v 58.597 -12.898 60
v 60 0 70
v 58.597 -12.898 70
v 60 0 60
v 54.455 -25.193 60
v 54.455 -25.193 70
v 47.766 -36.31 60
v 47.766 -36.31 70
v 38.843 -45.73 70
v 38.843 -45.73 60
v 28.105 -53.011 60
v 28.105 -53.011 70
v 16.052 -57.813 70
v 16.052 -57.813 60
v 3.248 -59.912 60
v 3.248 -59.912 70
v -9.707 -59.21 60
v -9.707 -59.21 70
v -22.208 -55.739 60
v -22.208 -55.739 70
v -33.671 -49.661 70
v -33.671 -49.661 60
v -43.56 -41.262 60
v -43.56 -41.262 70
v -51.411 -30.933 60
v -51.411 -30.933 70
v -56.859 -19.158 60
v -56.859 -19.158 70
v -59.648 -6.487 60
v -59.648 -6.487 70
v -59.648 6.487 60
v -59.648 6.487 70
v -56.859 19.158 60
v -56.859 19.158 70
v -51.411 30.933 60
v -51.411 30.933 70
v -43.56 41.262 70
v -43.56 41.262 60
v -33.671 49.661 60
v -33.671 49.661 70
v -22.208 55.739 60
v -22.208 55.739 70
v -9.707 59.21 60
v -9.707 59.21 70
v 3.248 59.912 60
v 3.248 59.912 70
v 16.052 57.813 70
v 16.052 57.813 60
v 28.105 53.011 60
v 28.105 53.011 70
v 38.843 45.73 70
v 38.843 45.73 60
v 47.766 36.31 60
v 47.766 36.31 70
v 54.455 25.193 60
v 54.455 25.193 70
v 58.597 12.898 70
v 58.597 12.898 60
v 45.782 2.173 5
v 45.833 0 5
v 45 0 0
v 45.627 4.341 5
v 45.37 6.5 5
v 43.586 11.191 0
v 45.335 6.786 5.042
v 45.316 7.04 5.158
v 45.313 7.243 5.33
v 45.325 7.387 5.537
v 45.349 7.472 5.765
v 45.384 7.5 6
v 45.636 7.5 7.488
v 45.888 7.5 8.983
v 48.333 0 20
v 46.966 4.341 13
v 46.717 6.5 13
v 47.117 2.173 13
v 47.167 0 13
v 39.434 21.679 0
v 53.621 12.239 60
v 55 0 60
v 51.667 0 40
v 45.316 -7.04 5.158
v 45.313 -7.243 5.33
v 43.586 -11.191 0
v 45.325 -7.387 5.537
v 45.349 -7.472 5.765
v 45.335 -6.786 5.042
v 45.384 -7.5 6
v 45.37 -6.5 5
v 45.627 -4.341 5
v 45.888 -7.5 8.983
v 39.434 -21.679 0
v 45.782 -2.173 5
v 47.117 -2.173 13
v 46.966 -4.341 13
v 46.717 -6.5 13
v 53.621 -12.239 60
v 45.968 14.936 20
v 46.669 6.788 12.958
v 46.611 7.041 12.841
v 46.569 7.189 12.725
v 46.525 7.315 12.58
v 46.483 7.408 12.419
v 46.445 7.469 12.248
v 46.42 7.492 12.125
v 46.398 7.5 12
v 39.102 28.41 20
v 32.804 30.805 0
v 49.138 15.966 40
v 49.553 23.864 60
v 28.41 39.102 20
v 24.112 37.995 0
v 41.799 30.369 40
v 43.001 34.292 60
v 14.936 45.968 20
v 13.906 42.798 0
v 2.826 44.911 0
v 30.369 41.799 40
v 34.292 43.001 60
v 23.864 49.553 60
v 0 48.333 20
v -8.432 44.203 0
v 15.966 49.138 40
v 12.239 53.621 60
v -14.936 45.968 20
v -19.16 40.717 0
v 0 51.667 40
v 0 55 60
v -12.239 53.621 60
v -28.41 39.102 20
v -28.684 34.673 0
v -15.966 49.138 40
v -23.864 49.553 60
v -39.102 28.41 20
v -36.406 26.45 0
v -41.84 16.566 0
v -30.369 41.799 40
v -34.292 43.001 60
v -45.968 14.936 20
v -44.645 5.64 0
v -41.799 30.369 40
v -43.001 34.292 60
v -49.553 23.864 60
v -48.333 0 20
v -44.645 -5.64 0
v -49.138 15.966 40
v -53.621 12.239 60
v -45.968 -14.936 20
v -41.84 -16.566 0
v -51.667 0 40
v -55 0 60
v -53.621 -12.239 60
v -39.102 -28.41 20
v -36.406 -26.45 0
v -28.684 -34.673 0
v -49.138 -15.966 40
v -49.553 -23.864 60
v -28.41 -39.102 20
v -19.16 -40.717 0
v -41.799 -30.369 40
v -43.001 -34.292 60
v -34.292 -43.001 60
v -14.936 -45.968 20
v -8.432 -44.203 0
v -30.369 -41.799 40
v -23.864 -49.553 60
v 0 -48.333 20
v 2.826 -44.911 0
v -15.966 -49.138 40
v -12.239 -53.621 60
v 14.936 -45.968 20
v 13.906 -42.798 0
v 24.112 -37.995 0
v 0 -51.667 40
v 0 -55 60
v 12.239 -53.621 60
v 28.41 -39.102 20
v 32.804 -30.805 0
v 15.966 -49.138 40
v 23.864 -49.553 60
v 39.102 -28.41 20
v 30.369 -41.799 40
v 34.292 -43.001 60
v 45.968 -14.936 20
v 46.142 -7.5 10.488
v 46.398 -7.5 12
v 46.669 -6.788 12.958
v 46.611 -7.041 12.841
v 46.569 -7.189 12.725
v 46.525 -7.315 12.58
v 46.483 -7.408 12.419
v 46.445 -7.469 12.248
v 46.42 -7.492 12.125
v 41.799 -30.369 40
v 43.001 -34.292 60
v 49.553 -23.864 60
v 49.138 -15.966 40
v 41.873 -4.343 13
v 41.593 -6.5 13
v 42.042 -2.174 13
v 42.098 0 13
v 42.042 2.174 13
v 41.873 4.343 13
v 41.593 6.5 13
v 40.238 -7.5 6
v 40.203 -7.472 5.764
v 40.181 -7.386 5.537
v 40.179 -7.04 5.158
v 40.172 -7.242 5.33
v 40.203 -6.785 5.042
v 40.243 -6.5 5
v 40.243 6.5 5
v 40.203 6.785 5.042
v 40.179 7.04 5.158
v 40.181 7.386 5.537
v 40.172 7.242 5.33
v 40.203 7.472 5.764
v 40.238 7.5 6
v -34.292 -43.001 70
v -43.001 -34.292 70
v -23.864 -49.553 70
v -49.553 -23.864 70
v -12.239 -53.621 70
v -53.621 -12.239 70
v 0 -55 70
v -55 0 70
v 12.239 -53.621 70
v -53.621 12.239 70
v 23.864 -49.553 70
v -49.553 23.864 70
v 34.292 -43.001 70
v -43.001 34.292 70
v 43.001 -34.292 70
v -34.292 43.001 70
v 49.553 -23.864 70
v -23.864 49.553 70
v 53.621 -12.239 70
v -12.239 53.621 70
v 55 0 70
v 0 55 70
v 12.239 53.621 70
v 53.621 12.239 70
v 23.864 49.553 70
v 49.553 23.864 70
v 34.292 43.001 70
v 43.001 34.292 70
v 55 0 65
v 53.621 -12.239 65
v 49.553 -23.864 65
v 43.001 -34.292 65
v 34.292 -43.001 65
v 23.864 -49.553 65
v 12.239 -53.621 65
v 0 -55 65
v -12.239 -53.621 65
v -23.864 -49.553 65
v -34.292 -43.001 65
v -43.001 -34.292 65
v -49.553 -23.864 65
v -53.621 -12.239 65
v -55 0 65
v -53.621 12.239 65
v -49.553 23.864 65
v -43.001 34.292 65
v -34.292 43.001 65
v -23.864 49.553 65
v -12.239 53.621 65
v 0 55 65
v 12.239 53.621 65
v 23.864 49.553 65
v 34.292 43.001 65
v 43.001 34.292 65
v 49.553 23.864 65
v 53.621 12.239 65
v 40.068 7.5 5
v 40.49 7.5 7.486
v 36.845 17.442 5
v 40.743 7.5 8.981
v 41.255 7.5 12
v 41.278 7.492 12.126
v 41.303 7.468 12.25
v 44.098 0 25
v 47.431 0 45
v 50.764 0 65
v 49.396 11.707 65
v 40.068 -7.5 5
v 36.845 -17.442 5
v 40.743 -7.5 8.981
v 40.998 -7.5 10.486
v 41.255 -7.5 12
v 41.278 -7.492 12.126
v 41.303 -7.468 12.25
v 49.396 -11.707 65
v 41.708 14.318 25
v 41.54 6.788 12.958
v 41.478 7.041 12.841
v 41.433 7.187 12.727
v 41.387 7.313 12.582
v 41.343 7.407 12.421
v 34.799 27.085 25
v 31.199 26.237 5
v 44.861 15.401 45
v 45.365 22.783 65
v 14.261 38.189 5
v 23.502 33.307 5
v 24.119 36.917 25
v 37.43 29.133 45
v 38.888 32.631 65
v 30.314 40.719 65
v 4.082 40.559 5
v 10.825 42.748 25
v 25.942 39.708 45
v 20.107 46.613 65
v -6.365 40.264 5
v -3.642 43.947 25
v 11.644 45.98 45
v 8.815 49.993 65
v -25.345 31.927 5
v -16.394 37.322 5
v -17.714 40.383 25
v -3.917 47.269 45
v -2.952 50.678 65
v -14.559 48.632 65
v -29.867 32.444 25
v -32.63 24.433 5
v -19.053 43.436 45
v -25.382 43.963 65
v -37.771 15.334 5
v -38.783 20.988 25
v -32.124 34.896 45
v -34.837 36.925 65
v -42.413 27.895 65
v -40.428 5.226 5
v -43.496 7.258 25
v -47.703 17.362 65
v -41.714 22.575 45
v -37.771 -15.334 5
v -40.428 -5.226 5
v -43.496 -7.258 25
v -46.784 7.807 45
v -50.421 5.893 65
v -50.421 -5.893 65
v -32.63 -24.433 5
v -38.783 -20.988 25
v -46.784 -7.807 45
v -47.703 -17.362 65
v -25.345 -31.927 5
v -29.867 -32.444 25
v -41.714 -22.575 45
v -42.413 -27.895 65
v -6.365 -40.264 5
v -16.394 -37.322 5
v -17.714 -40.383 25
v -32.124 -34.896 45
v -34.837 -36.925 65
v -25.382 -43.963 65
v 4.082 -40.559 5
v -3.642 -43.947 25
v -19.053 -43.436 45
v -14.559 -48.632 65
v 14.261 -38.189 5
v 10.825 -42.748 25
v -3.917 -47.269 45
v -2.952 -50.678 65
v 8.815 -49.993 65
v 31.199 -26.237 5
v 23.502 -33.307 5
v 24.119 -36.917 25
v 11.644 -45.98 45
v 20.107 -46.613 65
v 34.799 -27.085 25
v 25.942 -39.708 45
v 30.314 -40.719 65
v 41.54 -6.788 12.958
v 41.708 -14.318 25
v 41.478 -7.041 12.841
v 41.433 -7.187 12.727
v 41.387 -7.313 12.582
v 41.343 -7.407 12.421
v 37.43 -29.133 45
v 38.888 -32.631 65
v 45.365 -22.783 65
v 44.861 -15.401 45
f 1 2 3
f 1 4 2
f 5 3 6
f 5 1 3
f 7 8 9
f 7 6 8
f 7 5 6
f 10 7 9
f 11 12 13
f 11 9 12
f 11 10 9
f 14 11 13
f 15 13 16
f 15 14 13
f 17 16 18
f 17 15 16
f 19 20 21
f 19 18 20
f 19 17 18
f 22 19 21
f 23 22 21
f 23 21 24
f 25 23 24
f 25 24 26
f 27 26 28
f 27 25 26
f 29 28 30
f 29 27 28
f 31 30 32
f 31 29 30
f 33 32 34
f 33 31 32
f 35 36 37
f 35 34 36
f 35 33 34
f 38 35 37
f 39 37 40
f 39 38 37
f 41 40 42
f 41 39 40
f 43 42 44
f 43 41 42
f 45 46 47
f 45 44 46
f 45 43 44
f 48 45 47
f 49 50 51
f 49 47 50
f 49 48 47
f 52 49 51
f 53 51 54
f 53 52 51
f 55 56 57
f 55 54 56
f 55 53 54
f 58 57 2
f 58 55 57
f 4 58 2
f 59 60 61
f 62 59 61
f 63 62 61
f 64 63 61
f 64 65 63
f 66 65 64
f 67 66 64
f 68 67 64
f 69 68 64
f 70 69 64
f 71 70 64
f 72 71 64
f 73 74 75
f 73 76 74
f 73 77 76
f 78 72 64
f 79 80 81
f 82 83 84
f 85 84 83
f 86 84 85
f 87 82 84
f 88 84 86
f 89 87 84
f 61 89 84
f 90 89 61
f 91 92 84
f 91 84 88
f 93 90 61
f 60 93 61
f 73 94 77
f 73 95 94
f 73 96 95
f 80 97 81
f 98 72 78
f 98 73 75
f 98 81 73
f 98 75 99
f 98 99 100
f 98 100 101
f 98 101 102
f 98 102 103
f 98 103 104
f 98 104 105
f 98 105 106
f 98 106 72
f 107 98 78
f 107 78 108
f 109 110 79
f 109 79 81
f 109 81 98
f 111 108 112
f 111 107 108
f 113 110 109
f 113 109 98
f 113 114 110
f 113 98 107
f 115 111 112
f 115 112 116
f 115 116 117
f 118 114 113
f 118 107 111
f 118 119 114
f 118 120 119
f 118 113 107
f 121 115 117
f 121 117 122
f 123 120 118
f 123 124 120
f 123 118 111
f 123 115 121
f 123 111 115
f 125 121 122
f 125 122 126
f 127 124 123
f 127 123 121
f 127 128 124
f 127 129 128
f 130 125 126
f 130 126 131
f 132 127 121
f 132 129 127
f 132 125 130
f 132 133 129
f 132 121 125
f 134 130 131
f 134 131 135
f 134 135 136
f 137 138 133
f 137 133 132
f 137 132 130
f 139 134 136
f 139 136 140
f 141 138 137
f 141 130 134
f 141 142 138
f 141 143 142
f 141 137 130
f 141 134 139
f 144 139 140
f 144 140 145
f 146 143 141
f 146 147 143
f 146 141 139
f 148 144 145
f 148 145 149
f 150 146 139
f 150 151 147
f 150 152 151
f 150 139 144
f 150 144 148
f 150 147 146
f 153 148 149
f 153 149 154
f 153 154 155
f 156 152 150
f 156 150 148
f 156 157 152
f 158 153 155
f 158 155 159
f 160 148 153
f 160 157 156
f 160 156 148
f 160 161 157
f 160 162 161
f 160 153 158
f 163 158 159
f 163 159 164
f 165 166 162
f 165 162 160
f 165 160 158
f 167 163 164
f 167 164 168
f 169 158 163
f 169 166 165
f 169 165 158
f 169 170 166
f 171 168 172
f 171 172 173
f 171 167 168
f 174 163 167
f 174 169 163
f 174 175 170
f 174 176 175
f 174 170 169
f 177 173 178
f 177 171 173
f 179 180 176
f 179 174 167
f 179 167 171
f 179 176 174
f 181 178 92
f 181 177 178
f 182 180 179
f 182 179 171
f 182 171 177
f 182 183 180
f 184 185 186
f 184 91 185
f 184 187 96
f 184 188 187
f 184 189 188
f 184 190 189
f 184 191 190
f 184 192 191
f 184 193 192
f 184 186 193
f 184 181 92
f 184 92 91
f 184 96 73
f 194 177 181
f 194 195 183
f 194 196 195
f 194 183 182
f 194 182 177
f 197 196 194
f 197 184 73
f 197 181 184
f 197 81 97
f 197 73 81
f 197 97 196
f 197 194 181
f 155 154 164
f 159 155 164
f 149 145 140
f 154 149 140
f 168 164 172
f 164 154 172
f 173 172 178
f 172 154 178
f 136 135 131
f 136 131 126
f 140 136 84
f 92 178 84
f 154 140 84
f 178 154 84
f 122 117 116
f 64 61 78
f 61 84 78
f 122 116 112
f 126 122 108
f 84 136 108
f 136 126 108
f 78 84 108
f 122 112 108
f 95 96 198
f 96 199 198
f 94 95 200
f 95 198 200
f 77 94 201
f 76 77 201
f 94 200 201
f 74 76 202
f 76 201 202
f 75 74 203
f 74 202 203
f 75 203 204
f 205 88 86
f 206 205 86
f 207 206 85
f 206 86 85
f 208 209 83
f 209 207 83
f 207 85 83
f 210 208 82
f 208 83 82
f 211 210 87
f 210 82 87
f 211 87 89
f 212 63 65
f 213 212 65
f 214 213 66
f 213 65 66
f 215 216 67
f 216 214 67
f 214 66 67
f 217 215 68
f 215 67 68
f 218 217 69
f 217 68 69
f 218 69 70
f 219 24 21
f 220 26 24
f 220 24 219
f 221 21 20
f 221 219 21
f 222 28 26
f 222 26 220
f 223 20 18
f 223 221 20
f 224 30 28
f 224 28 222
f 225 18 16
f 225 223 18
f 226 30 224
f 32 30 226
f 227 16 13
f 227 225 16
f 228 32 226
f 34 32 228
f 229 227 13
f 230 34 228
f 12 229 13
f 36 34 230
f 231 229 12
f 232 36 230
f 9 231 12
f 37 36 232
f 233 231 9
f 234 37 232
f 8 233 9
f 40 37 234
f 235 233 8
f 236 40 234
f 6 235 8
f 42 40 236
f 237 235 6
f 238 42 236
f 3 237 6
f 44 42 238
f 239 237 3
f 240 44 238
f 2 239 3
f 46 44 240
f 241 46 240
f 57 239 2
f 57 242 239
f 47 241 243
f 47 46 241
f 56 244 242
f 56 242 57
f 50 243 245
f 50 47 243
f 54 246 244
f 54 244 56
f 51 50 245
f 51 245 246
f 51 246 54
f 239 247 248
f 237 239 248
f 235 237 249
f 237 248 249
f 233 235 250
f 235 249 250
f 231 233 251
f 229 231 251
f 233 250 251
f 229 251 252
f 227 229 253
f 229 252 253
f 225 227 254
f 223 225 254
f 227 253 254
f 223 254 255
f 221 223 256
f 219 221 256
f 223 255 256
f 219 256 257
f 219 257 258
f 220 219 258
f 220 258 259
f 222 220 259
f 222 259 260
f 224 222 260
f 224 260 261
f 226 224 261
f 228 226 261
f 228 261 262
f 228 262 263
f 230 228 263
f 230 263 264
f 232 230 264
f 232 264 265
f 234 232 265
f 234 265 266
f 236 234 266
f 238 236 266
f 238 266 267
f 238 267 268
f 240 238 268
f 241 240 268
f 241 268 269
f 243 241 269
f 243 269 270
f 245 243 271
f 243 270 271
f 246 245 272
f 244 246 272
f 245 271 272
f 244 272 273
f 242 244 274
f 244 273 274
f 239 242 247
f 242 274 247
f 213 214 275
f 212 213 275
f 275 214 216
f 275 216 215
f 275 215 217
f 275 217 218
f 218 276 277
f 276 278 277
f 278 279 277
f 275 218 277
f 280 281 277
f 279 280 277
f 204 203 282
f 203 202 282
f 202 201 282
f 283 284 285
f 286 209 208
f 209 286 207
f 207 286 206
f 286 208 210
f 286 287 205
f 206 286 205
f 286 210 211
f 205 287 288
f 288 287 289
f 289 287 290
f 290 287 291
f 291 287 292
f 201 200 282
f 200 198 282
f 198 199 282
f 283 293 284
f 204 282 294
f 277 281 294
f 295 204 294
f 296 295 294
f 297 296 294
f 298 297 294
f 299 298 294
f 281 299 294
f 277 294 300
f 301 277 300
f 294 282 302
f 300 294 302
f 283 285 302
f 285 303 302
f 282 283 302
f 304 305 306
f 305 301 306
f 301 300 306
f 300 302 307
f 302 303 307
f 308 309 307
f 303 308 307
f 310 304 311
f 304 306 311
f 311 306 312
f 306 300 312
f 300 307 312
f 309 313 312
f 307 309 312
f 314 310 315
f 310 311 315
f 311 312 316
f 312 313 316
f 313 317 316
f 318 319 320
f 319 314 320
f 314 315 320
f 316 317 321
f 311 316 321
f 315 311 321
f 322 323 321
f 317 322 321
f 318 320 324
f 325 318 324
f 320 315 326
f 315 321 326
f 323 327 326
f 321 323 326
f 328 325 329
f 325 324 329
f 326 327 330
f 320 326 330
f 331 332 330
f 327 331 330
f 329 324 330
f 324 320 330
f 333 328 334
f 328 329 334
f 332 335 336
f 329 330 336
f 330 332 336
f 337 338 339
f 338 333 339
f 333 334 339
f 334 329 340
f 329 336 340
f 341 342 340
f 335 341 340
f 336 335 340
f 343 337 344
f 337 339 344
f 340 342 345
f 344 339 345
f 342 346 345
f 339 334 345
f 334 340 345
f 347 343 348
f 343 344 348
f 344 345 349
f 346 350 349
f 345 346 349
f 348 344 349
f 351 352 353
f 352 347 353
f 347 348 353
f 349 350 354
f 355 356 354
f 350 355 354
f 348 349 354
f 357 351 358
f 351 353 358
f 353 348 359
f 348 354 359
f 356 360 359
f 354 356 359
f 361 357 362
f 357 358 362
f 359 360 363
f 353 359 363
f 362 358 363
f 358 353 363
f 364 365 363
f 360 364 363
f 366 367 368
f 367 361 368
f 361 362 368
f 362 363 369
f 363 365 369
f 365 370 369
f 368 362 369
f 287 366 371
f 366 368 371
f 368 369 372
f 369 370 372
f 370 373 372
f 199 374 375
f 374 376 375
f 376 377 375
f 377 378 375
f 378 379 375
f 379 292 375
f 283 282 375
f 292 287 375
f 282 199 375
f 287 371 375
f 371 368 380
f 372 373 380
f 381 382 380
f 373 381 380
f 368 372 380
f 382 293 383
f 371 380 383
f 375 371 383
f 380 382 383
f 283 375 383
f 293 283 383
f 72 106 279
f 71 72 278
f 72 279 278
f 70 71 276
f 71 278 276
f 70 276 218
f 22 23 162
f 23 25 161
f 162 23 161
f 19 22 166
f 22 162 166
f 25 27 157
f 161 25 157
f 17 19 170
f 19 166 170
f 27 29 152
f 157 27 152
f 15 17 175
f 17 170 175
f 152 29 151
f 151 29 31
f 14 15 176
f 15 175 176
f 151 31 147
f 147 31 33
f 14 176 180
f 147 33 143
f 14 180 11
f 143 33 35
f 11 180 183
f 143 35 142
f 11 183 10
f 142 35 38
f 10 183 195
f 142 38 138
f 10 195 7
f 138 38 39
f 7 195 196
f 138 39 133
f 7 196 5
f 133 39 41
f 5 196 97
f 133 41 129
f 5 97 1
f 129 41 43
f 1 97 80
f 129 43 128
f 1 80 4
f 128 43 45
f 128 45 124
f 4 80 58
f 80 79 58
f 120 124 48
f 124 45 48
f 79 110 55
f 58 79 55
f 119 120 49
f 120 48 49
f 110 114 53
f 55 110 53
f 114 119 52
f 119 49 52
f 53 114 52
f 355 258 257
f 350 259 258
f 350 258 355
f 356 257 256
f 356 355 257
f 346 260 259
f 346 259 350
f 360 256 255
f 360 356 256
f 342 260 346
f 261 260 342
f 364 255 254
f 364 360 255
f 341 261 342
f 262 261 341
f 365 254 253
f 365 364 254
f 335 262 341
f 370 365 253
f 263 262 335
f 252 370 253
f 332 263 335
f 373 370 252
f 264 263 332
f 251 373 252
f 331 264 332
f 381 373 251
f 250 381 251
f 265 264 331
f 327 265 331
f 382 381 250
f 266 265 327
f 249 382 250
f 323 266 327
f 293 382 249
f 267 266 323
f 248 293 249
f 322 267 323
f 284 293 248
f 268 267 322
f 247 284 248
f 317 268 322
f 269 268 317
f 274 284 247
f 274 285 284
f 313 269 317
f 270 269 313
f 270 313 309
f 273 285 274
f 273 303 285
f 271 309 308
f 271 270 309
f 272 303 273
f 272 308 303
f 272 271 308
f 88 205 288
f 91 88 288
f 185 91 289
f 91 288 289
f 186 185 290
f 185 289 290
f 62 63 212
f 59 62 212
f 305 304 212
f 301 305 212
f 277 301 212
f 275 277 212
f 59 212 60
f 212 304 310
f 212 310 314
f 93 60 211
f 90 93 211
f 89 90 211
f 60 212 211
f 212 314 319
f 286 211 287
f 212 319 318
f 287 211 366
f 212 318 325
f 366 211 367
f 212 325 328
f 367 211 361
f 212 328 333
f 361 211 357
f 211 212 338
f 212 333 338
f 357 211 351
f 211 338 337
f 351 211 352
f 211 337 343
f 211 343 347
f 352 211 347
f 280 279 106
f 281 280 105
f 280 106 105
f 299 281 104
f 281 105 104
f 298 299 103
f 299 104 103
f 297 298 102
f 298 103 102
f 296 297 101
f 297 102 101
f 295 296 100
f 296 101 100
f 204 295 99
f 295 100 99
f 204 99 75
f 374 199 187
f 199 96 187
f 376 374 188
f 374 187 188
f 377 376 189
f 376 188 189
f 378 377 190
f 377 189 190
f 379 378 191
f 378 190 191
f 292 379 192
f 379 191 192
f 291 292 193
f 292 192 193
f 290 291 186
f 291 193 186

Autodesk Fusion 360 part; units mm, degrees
sketch "Sketch1" plane through (0, 0, 0) normal (0, 1, 0) x (1, 0, 0)
  line L0 (0, 0) -> (0, -70)
  line L1 (0, -70) -> (60, -70)
  line L2 (60, -70) -> (60, -60)
  line L3 (60, -60) -> (55, -60)
  line L4 (55, -60) -> (45, 0)
  line L5 (45, 0) -> (0, 0)
  dimension "d1" = 90
  dimension "d2" = 70
  dimension "d3" = 45
  dimension "d4" = 60
  dimension "d5" = 5
  dimension "d6" = 10
revolve "Revolve1" add sketch "Sketch1" angle 360 about axis through (0, 0, 0) along (0, 0, 1)
shell "Shell1" thickness 5 removed faces 1 at (28.282, -12.1475, 70)
sketch "Sketch2" plane through (0, 0, 0) normal (1, 0, 0) x (0, 1, 0)
  line L0 (-7.5, 13) -> (7.5, 13)
  line L1 (7.5, 13) -> (7.5, 5)
  line L2 (7.5, 5) -> (-7.5, 5)
  line L3 (-7.5, 5) -> (-7.5, 13)
  dimension "d9" = 5
  dimension "d10" = 15
  dimension "d11" = 8
  dimension "d12" = 7.5
extrude "Extrude1" cut sketch "Sketch2" along normal through all
fillet "Fillet1" radius 1 4 edges at (42.642, 7.5, 5) (43.9954, 7.5, 13) (42.642, -7.5, 5) (43.9954, -7.5, 13)
